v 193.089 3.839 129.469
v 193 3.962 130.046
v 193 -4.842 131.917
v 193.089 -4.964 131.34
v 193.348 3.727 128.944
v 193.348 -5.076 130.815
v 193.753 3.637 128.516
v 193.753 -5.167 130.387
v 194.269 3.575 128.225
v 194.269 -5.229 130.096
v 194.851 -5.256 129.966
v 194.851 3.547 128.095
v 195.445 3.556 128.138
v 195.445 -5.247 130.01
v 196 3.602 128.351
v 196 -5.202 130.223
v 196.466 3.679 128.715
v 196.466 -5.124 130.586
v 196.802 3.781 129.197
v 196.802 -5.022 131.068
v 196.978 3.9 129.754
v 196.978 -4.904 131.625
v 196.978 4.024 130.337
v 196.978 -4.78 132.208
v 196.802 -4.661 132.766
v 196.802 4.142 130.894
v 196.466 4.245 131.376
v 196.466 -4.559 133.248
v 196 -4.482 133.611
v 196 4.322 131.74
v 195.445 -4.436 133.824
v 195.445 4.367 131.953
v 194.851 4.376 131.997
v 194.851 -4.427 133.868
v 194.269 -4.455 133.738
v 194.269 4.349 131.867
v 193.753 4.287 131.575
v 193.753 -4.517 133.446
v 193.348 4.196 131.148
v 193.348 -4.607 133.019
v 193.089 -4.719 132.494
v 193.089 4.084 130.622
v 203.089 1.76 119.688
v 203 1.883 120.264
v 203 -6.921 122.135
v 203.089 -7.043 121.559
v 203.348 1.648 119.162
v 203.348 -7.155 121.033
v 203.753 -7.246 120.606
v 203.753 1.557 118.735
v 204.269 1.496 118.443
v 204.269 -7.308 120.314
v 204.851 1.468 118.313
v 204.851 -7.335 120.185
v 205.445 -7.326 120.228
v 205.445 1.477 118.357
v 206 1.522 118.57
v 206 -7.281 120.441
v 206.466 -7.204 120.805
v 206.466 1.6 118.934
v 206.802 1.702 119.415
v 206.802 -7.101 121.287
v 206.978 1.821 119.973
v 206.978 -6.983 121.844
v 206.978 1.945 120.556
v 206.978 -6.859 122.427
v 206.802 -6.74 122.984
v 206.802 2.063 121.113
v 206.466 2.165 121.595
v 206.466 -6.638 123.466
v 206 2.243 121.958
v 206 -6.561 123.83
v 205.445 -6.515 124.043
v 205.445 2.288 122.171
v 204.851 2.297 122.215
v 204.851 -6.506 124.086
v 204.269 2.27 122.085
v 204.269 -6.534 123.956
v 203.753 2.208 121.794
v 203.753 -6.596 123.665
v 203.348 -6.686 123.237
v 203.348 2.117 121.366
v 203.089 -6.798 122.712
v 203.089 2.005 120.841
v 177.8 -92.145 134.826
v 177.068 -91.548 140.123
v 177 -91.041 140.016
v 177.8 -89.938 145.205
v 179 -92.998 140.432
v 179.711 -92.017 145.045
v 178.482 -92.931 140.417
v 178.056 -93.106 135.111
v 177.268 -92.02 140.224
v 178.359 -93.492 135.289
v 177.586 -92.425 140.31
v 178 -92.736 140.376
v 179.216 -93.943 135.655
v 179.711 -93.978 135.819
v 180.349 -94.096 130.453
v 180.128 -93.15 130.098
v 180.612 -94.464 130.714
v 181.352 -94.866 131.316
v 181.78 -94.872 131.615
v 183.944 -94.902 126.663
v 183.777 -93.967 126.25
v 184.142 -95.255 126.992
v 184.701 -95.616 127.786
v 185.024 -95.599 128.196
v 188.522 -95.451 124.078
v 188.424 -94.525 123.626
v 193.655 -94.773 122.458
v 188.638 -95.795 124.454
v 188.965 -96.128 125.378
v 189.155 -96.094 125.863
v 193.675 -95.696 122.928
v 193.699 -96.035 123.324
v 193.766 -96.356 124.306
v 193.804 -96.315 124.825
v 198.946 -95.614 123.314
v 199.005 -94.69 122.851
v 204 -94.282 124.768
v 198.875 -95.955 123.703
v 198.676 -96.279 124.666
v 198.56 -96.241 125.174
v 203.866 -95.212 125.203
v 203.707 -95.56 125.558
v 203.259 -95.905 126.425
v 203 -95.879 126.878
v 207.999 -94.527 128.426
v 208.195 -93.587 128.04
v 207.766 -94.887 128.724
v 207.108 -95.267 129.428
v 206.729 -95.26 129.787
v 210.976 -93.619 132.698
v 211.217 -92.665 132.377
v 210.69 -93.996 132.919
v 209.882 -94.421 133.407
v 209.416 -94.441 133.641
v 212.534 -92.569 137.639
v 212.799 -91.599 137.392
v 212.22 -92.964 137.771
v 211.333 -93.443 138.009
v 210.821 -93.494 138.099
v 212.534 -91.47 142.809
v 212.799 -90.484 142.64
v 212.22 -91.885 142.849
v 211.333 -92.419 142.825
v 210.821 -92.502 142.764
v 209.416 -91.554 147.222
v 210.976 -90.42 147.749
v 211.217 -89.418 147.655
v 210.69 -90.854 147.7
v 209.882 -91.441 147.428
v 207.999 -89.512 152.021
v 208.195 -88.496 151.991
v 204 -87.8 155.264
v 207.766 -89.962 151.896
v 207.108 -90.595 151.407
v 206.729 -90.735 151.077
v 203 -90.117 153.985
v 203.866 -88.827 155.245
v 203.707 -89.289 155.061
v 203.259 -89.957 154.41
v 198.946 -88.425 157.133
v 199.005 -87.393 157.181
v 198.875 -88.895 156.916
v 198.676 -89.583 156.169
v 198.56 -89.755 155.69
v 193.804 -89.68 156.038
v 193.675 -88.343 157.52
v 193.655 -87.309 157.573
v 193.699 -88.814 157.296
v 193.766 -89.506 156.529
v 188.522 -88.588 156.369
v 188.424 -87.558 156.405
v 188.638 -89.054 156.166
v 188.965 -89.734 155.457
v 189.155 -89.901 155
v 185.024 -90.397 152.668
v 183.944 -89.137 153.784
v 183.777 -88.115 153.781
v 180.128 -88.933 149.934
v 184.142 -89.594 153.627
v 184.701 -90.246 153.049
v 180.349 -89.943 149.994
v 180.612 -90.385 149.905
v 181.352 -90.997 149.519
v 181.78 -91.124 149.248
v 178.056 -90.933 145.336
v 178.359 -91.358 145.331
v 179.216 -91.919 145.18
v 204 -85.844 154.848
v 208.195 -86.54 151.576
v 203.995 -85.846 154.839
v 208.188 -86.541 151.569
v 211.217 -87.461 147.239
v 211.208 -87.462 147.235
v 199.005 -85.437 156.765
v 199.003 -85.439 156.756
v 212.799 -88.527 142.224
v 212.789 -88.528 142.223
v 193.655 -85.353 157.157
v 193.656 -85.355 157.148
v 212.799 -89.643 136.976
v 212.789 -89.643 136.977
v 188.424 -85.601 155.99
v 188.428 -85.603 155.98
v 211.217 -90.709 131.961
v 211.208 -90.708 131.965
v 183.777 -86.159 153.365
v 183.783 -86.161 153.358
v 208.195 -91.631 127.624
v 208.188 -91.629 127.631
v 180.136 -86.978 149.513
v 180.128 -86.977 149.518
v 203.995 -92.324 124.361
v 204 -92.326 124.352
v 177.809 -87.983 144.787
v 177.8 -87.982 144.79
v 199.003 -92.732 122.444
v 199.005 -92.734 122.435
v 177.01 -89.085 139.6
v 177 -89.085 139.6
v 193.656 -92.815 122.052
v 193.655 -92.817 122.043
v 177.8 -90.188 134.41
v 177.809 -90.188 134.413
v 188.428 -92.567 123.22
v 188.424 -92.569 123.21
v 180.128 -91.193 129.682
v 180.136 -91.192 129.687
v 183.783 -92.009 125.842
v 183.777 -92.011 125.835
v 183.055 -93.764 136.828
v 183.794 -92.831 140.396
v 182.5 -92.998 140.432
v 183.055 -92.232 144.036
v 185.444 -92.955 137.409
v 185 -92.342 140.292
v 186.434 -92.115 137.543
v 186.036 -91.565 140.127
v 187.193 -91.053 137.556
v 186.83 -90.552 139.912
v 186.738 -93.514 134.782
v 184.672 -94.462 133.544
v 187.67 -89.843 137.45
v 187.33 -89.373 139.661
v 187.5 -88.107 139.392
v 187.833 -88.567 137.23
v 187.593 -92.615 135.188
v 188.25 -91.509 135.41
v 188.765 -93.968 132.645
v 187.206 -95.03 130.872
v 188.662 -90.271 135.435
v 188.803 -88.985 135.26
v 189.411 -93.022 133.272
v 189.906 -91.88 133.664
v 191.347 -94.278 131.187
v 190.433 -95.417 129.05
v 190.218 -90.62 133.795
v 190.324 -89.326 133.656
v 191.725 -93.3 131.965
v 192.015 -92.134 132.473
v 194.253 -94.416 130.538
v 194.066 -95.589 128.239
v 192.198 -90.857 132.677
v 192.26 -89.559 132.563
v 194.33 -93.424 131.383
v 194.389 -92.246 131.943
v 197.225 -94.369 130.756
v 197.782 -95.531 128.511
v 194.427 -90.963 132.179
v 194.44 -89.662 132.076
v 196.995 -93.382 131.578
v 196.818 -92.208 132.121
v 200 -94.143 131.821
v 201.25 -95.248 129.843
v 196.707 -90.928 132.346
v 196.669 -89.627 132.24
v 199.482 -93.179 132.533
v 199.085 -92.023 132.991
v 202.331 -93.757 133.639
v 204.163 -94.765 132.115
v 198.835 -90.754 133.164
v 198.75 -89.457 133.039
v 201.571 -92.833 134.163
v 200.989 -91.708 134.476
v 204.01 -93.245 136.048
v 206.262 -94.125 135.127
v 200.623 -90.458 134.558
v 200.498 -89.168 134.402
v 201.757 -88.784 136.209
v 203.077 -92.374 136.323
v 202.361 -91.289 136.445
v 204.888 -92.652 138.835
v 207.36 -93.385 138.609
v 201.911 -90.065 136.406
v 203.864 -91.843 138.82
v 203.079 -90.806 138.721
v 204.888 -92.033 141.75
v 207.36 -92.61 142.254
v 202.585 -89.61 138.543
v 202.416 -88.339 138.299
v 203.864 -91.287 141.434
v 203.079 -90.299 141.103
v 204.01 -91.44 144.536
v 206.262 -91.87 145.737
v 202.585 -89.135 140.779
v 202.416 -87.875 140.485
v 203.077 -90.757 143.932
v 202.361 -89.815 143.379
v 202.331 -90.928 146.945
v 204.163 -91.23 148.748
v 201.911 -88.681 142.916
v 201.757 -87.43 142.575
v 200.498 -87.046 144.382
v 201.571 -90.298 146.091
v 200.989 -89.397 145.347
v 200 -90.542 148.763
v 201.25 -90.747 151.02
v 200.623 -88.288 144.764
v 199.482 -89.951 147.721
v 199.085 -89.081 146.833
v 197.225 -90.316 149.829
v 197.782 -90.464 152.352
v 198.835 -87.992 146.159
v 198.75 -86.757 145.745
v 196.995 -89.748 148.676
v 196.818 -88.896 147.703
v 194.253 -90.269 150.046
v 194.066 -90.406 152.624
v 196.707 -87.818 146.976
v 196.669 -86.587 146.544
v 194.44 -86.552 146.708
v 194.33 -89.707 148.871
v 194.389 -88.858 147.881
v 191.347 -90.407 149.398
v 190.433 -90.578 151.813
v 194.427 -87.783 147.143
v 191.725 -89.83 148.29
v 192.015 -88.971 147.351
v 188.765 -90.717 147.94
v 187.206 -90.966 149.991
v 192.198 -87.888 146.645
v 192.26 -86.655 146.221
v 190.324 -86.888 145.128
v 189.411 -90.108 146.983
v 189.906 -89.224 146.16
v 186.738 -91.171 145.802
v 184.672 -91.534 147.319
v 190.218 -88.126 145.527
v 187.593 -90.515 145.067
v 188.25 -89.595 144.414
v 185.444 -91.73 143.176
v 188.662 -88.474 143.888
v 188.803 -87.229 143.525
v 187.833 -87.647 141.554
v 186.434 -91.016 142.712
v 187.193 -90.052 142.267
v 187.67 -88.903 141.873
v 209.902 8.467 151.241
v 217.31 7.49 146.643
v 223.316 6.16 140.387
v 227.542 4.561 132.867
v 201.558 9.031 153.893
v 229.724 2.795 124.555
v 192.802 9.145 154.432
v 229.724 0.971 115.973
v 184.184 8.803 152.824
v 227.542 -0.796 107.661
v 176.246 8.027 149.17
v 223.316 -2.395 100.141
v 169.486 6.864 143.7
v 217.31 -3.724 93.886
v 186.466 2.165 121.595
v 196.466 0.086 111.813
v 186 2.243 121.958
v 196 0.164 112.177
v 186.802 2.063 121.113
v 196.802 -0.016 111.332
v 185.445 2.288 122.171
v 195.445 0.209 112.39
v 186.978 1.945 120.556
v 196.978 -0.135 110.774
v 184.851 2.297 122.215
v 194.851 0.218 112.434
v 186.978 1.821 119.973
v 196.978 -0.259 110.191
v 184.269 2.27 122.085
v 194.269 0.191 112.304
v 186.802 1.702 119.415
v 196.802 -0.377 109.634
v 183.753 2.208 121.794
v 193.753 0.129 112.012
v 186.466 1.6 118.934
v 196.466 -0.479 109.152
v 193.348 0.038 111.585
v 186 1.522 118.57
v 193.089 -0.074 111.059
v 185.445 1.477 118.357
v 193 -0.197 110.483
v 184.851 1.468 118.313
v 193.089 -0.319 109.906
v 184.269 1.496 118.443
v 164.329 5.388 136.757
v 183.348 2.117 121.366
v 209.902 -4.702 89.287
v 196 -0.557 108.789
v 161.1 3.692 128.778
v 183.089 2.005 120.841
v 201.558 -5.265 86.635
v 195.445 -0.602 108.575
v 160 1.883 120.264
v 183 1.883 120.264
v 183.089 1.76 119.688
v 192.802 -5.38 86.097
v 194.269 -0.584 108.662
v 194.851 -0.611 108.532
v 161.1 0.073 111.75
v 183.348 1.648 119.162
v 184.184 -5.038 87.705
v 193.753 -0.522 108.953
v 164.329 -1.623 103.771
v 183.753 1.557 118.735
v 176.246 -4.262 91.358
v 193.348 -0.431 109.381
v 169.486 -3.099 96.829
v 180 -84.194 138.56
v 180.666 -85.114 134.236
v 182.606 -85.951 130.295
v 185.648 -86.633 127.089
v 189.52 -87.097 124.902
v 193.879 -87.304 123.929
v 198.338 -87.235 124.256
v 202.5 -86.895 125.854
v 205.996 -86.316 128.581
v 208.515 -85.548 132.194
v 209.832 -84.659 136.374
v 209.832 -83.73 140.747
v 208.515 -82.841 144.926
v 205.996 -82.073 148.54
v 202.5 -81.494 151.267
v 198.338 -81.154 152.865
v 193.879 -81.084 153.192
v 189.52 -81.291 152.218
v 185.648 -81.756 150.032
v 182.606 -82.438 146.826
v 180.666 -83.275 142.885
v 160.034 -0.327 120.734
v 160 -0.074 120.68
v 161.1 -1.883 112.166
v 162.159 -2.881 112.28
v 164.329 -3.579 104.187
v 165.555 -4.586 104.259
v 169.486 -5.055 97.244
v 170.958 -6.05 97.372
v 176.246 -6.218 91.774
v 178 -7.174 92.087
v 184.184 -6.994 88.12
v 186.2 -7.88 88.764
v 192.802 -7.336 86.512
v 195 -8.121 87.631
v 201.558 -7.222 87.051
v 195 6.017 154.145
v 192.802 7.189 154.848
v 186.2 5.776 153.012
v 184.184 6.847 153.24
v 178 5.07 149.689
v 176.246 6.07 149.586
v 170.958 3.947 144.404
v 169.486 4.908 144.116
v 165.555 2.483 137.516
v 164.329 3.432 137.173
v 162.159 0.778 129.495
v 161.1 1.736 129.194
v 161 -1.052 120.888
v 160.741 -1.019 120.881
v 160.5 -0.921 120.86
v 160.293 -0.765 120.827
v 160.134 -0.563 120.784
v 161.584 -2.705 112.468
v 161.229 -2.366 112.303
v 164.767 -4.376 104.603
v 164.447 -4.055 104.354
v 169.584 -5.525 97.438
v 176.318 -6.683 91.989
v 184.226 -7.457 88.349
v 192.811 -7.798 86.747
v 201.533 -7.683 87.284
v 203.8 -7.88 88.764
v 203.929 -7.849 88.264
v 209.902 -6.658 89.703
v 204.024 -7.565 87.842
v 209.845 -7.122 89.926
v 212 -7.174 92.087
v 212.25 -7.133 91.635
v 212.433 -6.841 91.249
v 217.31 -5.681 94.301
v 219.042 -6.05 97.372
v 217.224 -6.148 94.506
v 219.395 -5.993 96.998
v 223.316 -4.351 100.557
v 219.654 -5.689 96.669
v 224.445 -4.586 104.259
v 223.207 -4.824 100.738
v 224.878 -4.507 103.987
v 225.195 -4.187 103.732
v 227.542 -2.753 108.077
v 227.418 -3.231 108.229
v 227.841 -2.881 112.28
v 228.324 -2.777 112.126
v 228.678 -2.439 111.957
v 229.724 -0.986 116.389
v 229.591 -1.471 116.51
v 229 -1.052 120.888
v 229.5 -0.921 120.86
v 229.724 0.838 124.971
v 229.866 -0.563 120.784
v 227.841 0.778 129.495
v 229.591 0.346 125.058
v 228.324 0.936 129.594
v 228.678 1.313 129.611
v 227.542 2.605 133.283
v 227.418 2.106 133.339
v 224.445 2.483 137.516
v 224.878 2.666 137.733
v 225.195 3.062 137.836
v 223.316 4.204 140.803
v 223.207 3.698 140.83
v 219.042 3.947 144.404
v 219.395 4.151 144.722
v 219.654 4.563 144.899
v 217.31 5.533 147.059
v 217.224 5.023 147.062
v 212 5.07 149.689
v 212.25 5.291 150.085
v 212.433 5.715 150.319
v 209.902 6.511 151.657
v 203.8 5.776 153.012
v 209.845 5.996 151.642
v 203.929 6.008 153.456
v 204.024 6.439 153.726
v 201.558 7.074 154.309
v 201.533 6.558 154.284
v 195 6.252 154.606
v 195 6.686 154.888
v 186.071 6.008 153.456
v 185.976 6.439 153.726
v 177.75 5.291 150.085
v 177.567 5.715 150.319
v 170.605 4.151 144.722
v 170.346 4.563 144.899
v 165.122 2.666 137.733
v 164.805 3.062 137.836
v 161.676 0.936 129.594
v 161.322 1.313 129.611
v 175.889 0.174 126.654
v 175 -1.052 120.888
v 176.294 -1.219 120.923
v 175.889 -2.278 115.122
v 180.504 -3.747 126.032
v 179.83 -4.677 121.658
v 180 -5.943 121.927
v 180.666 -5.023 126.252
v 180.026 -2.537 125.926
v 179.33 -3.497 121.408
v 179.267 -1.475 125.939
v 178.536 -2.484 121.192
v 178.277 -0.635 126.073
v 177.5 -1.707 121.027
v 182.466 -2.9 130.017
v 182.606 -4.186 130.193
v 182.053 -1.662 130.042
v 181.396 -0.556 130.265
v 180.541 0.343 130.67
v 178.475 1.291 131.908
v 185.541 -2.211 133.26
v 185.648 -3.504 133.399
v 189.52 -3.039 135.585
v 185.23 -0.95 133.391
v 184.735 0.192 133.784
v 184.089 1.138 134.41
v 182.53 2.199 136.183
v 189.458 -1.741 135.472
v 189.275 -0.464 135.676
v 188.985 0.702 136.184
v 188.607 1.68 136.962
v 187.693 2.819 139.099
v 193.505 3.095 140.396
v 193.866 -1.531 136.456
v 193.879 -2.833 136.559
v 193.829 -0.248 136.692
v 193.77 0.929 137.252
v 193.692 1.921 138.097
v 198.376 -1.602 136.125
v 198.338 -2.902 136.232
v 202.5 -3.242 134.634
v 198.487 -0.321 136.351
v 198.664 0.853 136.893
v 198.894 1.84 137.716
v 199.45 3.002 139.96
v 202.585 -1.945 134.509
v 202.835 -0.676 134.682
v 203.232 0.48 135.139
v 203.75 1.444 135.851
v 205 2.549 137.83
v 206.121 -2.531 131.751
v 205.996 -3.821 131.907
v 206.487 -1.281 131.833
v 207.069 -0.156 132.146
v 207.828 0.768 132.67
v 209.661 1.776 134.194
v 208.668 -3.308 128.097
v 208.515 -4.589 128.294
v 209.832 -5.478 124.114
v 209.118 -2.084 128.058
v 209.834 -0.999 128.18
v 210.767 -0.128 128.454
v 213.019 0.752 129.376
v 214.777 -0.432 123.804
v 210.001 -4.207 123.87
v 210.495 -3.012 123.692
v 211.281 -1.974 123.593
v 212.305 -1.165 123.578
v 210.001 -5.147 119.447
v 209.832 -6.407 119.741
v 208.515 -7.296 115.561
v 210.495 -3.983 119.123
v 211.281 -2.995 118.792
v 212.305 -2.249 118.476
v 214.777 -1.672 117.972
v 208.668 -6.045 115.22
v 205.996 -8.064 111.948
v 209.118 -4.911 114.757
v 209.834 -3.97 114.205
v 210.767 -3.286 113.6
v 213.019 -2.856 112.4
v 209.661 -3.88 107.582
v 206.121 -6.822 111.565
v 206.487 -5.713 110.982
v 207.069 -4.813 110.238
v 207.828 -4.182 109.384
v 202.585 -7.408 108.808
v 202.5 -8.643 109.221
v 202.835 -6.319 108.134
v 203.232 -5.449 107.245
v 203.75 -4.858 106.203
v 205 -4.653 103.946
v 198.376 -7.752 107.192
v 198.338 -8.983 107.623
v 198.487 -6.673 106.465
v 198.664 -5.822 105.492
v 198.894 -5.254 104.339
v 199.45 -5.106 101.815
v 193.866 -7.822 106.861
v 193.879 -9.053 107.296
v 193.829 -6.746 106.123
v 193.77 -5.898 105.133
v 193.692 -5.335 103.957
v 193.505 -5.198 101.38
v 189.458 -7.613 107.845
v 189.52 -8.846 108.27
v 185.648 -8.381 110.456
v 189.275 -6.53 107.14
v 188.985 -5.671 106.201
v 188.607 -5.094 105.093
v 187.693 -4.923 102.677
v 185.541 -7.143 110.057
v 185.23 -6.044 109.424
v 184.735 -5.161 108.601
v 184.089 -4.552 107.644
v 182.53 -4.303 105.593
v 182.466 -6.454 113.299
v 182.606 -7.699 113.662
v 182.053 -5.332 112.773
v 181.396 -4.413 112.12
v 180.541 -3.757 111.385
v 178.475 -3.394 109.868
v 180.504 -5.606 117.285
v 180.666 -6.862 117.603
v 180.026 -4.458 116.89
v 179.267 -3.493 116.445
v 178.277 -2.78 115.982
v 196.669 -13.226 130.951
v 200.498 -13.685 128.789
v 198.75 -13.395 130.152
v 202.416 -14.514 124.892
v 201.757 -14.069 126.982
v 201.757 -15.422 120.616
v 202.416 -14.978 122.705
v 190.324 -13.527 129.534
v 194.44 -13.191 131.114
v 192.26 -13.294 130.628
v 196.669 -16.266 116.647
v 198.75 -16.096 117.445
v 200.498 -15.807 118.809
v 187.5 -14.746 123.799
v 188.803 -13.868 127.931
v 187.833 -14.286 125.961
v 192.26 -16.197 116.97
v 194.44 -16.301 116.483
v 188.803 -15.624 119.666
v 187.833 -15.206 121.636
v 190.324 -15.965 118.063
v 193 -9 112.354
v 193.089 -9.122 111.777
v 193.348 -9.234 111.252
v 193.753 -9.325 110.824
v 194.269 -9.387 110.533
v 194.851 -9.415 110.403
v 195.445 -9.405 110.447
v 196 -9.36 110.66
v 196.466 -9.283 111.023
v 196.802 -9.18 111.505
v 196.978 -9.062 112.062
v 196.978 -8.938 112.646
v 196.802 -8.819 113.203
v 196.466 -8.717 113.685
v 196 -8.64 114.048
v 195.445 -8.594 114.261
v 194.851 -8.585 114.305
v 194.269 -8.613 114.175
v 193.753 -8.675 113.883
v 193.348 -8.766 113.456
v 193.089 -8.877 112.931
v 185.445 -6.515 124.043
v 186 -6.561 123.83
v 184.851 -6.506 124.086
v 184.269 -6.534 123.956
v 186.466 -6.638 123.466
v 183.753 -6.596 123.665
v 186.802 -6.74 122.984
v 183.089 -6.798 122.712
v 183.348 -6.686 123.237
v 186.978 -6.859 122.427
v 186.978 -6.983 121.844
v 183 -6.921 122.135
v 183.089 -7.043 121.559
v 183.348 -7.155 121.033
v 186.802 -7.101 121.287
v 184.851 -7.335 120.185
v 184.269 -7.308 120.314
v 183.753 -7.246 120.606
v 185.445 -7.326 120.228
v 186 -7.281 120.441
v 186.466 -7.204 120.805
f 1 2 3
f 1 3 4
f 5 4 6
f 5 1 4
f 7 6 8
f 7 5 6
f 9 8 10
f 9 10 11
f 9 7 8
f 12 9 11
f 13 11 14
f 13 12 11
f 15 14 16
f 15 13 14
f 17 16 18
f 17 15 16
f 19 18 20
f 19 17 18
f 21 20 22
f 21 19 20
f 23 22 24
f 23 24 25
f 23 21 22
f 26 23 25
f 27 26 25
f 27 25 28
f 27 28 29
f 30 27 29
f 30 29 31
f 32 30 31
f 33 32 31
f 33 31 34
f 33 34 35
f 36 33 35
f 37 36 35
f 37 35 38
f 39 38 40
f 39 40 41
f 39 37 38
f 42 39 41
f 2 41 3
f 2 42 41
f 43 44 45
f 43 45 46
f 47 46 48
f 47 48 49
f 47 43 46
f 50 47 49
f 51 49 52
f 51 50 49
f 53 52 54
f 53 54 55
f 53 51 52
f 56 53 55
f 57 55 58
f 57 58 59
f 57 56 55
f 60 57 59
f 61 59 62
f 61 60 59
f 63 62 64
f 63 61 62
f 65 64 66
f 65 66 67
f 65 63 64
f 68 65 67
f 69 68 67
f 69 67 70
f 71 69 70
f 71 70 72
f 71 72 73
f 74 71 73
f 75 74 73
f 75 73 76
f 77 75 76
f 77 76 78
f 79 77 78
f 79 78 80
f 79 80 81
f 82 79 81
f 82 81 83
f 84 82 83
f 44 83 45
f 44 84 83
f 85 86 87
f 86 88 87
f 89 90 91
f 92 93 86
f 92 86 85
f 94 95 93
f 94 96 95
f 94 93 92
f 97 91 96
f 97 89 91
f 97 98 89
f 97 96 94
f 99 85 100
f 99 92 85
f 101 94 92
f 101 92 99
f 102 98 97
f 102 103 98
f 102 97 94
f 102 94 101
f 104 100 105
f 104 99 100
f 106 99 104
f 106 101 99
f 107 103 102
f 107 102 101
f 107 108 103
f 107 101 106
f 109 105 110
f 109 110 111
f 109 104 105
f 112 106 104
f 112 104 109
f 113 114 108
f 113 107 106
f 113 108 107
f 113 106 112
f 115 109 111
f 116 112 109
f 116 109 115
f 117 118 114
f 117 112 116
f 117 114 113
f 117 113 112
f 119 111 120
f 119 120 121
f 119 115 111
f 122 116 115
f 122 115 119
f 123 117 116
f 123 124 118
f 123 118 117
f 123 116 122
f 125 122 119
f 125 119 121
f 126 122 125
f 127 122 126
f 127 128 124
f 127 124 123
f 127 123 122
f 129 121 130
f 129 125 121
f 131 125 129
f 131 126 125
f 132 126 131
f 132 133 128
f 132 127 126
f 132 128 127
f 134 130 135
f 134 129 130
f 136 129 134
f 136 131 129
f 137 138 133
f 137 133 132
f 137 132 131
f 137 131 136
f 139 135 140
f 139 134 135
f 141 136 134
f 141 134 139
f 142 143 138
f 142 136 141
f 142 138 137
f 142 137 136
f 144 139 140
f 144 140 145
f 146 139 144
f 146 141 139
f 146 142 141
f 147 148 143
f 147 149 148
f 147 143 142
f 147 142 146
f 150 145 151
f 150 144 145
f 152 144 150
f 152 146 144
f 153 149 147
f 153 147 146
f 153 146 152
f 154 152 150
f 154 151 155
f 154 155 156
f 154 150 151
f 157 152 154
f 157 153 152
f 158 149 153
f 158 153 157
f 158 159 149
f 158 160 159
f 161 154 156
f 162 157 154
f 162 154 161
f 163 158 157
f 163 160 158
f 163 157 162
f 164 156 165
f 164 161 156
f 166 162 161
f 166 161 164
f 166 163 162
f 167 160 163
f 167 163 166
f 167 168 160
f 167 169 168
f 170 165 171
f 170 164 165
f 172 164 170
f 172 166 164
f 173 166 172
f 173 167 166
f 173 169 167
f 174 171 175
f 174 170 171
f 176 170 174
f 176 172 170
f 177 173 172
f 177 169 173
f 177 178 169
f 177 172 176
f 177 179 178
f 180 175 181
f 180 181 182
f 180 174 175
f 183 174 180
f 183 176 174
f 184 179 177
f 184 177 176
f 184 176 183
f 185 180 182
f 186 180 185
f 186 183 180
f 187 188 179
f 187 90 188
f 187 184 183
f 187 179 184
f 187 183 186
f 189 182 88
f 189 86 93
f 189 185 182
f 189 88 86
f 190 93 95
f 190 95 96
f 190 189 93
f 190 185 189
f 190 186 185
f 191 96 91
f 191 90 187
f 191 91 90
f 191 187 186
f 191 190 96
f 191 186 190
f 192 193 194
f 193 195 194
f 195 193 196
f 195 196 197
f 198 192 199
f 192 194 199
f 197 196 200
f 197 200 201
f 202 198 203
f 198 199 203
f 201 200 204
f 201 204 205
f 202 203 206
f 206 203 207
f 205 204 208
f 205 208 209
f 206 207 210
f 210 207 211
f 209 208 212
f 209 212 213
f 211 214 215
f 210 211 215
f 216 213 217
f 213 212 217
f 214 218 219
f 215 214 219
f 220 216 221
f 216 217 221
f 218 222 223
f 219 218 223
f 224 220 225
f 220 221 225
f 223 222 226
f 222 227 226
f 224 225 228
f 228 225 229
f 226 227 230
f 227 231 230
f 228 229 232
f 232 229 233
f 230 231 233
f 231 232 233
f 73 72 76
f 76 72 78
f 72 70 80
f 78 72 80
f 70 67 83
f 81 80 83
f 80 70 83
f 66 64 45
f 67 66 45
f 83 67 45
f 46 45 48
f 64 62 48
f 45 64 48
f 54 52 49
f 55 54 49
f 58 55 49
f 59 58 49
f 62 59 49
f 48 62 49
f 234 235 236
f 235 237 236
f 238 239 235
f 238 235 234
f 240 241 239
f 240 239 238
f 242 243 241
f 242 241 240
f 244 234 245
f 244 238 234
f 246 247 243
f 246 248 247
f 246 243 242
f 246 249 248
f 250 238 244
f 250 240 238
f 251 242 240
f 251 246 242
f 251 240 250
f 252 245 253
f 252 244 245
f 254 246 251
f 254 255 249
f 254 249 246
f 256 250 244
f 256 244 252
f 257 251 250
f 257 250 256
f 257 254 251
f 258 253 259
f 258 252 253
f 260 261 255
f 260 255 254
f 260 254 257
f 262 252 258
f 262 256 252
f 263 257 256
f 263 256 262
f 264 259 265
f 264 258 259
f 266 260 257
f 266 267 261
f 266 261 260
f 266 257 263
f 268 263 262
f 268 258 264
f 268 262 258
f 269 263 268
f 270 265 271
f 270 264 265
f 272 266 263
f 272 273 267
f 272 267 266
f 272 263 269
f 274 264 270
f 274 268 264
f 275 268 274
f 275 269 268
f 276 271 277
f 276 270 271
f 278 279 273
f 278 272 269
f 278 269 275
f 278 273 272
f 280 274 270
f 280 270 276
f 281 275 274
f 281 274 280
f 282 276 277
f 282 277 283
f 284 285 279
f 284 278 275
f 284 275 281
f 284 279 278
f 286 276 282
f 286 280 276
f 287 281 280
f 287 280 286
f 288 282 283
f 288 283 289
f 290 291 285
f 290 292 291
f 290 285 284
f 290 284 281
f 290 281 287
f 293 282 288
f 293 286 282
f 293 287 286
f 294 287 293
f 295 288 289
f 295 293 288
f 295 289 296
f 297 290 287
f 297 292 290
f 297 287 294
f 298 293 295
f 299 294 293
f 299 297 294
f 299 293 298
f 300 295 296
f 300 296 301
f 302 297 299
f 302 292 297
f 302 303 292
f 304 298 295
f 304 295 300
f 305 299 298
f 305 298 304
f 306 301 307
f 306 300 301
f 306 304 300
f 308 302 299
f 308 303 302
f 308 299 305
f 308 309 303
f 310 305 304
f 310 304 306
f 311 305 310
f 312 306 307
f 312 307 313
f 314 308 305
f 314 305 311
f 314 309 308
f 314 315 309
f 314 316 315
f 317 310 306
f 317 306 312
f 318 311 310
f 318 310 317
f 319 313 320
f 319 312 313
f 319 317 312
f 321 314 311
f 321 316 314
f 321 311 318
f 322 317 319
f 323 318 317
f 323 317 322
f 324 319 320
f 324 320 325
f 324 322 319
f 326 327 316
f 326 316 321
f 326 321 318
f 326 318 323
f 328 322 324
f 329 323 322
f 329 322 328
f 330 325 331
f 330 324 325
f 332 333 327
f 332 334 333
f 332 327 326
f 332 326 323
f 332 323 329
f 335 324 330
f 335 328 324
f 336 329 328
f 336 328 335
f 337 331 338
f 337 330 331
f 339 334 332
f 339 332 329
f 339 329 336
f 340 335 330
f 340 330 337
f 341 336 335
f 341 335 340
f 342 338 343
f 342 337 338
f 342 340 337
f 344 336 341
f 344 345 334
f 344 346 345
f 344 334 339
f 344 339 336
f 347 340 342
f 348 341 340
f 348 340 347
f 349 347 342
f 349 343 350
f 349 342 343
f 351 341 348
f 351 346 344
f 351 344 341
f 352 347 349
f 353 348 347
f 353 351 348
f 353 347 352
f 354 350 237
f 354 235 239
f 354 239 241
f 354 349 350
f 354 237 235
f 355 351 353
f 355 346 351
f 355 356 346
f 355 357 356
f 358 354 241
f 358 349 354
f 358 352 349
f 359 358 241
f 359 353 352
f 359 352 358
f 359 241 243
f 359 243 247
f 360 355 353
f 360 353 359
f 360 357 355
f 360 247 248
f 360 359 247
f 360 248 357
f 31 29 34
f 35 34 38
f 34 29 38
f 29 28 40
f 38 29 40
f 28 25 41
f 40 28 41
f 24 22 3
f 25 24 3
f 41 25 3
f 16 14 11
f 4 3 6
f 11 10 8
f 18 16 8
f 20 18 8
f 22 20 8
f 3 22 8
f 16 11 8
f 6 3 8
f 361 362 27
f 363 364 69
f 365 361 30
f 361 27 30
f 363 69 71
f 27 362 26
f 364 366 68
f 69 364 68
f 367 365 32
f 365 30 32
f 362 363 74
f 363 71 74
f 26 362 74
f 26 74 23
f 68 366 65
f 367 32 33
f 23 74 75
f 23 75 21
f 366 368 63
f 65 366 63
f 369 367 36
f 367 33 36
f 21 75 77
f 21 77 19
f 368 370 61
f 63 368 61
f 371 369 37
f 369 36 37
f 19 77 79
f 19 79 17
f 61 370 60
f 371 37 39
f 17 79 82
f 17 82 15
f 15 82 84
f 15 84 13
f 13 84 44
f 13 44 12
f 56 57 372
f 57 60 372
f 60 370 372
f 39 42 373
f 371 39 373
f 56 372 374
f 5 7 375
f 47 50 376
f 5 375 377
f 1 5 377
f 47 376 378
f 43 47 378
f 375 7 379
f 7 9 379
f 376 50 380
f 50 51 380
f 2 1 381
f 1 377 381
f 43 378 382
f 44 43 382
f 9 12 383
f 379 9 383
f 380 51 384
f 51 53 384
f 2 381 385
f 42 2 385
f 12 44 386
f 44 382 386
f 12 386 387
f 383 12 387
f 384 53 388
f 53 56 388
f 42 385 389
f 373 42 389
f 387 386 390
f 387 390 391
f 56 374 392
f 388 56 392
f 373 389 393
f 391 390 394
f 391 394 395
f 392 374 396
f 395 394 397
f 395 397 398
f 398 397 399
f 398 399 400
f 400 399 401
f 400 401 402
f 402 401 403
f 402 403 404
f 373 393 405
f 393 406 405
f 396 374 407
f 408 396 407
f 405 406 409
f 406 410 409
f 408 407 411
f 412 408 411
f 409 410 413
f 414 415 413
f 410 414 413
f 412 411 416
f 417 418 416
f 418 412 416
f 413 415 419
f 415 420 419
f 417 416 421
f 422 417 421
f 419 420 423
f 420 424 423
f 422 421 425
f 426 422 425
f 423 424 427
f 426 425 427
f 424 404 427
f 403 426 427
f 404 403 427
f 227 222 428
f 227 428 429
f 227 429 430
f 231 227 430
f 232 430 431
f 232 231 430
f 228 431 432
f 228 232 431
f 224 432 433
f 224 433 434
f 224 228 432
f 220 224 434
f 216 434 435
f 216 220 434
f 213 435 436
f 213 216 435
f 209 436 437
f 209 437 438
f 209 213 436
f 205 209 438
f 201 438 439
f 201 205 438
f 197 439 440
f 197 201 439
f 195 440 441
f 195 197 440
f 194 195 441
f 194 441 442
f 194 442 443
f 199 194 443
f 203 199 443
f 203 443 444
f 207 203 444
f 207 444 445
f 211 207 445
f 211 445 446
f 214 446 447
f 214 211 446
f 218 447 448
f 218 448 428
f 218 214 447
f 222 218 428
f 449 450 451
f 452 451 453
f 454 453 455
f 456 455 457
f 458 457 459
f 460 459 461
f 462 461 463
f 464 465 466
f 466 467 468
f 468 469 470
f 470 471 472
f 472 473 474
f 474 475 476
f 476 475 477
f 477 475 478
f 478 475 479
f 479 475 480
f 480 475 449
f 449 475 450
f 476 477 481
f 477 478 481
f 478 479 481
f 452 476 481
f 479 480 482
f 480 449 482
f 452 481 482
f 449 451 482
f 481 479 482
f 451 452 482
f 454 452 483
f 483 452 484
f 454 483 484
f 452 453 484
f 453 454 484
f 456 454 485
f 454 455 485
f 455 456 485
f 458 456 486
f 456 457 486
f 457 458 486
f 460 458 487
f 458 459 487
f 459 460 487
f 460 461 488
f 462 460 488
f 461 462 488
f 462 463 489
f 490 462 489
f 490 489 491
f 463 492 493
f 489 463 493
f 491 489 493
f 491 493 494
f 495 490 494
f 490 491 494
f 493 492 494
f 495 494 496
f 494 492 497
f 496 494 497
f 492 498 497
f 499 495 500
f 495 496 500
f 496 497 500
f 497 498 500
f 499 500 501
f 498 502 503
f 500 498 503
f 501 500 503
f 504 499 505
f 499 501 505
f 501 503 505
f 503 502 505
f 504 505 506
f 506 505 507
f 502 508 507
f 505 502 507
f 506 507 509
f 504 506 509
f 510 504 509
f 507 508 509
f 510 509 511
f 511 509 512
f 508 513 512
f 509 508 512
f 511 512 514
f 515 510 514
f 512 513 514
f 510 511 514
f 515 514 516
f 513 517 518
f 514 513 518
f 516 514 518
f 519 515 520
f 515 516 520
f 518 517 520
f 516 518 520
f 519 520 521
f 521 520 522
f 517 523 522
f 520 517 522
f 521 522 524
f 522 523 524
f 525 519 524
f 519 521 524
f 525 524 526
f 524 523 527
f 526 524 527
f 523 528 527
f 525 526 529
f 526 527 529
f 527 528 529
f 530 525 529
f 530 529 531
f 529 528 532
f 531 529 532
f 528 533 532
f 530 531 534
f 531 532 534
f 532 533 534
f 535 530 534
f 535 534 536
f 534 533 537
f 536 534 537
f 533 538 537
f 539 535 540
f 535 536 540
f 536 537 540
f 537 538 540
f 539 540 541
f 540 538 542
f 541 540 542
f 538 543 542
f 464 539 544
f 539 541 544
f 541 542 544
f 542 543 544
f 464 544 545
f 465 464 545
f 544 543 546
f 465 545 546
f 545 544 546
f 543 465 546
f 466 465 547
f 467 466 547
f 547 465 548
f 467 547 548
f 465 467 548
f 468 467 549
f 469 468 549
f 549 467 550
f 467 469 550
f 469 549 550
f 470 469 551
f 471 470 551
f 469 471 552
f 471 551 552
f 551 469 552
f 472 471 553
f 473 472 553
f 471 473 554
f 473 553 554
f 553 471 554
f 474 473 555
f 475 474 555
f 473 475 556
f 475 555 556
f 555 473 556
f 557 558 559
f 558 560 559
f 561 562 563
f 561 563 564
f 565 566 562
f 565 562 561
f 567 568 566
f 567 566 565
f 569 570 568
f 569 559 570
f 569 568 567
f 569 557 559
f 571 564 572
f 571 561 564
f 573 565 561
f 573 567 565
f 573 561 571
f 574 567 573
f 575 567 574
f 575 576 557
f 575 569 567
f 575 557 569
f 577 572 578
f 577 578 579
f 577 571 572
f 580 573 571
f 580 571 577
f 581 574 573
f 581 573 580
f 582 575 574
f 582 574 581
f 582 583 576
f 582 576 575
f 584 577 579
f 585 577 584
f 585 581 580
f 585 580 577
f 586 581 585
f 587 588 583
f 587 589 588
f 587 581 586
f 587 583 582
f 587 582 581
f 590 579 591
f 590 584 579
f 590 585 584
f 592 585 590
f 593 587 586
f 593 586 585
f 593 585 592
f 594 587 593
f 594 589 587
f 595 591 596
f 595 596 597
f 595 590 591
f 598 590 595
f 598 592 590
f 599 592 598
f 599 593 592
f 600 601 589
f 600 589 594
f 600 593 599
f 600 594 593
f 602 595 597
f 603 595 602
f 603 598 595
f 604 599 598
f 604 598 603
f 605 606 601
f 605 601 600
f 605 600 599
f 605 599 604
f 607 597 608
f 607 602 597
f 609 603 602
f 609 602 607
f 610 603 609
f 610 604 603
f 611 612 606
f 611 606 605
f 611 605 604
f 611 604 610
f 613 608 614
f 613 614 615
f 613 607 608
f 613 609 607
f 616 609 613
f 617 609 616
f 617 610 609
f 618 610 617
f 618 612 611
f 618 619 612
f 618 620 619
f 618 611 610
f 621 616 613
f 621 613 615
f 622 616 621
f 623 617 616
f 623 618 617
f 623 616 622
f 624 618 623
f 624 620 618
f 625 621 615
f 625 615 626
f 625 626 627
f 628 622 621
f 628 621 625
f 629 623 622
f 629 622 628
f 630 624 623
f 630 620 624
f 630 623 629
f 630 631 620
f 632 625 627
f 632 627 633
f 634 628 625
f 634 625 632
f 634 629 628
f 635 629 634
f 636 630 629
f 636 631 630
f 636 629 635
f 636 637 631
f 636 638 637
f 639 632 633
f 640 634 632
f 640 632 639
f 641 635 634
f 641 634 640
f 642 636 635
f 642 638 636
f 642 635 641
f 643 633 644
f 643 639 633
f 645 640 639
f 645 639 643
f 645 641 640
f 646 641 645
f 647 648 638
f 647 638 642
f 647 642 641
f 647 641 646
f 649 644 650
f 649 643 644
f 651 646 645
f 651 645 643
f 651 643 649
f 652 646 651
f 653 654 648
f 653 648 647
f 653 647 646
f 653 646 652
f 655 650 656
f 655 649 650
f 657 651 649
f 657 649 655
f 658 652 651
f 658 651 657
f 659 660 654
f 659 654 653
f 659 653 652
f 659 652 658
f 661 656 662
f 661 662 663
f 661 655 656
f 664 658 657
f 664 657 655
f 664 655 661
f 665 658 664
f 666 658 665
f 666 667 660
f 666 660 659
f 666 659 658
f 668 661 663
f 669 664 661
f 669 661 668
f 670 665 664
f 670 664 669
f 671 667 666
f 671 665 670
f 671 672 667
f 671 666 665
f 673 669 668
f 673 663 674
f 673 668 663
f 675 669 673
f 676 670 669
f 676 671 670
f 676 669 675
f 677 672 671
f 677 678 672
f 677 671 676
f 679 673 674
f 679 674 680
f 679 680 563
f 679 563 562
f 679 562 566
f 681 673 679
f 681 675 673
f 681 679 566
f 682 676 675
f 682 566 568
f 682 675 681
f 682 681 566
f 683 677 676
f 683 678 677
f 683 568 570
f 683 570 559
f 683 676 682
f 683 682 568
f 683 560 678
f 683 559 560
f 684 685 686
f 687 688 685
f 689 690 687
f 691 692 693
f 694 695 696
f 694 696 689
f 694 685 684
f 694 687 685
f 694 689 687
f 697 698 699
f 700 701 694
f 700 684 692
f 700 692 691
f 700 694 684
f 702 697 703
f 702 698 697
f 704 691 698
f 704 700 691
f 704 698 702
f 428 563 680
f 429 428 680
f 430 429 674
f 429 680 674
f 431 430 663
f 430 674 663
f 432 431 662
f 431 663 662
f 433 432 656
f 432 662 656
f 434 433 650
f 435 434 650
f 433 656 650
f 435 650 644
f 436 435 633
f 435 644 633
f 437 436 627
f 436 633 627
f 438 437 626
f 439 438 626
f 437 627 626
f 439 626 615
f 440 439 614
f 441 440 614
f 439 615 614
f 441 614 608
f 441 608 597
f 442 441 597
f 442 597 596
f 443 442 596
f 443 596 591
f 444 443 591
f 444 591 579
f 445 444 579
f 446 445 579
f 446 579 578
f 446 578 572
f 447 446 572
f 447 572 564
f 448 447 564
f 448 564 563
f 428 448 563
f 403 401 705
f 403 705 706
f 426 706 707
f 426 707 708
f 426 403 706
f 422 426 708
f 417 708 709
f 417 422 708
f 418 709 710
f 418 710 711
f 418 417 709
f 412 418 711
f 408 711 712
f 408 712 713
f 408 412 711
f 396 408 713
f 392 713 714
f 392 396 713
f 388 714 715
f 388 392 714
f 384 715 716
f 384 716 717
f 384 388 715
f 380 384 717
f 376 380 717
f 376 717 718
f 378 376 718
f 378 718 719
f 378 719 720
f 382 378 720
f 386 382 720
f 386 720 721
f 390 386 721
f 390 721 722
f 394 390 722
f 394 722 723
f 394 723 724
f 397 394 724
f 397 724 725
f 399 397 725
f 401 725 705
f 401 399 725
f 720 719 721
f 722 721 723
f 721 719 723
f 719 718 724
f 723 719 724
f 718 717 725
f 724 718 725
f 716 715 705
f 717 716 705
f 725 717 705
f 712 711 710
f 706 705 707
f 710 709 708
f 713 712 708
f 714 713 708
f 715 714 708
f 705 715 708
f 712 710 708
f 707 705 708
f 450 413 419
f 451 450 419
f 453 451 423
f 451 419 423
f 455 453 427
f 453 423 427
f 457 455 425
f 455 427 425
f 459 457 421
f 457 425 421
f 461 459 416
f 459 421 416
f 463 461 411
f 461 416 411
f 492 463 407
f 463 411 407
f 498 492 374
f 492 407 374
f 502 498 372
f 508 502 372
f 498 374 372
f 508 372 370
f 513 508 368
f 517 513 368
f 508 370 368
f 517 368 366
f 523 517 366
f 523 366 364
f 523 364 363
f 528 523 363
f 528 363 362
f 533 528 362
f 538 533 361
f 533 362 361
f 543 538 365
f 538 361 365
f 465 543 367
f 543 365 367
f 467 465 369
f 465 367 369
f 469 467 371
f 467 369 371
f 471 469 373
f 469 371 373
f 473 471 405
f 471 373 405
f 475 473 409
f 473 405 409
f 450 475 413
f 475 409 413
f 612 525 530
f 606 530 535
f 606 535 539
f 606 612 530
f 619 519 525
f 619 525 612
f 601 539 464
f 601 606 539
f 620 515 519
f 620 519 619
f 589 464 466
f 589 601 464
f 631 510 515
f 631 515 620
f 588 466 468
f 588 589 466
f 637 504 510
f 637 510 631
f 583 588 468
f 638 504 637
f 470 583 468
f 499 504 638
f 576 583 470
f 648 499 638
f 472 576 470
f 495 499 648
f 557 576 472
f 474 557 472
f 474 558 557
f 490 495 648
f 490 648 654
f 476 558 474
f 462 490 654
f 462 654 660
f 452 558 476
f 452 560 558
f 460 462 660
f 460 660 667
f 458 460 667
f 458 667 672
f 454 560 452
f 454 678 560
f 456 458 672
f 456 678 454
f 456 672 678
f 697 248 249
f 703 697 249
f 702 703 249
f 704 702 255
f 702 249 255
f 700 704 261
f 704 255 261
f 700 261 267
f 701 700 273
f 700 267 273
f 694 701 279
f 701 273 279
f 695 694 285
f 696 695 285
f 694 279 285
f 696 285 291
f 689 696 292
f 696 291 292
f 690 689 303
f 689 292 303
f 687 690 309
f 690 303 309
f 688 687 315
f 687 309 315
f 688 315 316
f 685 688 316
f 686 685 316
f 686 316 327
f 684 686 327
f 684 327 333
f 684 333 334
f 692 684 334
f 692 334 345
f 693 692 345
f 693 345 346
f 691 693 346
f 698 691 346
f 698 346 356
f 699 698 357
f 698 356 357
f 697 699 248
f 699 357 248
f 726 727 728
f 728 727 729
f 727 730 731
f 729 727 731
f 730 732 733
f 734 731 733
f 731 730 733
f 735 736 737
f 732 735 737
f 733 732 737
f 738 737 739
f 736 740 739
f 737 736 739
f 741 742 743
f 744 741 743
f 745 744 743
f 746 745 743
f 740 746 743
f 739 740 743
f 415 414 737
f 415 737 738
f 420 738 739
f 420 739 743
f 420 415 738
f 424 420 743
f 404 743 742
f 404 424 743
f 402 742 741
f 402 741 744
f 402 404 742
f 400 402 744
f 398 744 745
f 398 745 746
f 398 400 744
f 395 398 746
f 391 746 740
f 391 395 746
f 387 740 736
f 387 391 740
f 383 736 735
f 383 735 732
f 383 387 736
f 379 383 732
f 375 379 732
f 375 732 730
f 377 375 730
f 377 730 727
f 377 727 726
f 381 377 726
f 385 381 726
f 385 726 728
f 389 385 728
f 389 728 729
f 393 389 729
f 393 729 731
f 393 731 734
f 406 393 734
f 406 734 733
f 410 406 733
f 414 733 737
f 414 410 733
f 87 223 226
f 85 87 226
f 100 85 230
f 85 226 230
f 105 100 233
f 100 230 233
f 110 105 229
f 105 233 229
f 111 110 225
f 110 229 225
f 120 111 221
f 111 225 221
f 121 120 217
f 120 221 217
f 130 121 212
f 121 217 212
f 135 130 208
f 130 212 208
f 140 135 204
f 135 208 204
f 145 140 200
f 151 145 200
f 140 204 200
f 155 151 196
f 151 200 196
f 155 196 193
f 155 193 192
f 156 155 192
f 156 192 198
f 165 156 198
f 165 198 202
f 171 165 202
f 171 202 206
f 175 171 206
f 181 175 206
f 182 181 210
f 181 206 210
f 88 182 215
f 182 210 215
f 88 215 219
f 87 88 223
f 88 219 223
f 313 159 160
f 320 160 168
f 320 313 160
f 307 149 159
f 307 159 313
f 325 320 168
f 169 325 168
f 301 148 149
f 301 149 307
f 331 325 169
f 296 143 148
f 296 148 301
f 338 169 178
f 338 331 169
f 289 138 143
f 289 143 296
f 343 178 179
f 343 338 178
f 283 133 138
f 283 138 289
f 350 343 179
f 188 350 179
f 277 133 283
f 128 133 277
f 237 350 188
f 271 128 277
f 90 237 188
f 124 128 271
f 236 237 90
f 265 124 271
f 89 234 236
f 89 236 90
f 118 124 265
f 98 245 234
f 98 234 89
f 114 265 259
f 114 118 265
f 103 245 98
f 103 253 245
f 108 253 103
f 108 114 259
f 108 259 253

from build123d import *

# Parameters (mm, degrees)
SKETCH029_R      = 35
PAD012_DEPTH     = 3
SKETCH030_R      = 15
PAD013_DEPTH     = 93
SKETCH031_R      = 18
PAD014_DEPTH     = 4
SKETCH032_R      = 7.5
POCKET010_DEPTH  = 80
SKETCH033_R      = 2
POCKET011_DEPTH  = 9
FILLET013_R      = 5
FILLET014_R      = 1
CHAMFER004_SIZE2 = 2.99
CHAMFER004_SIZE  = 5
FILLET015_R      = 2


with BuildPart() as part:
    # Sketch029 (on DatumPlane) → Pad012 (new body)
    with BuildSketch(Plane(origin=(0, 5.625, 137.8708612235), x_dir=(-1, 0, 0), z_dir=(0, -0.9781476007, 0.2079116908))):
        with Locations((-195, 18)):
            Circle(SKETCH029_R)
    extrude(amount=PAD012_DEPTH)

    # Sketch030 (on DatumPlane) → Pad013 (join)
    with BuildSketch(Plane(origin=(0, 5.625, 137.8708612235), x_dir=(-1, 0, 0), z_dir=(0, -0.9781476007, 0.2079116908))):
        with Locations((-195, 18)):
            Circle(SKETCH030_R)
    extrude(amount=PAD013_DEPTH)

    # Sketch031 (on Face6 of Pad013) → Pad014 (join)
    with BuildSketch(Plane(origin=(0, -85.3427268682, 157.2066484695), x_dir=(-1, 0, 0), z_dir=(0, -0.9781476007, 0.2079116908))):
        with Locations((-195, 18)):
            Circle(SKETCH031_R)
    extrude(amount=PAD014_DEPTH)

    # Sketch032 (on Face3 of Pad014) → Pocket010 (cut)
    with BuildSketch(Plane(origin=(0, -89.2553172712, 158.0382952328), x_dir=(-1, 0, 0), z_dir=(0, -0.9781476007, 0.2079116908))):
        with Locations((-195, 18)):
            Circle(SKETCH032_R)
    extrude(amount=-POCKET010_DEPTH, mode=Mode.SUBTRACT)

    # Sketch033 (on ReferenceDatumPlane) → Pocket011 (cut)
    with BuildSketch(Plane(origin=(0, 5.625, 137.8708612235), x_dir=(-1, 0, 0), z_dir=(0, -0.9781476007, 0.2079116908))):
        with Locations((-195, 28)):
            Circle(SKETCH033_R)
        with Locations((-185, 18)):
            Circle(SKETCH033_R)
        with Locations((-195, 8)):
            Circle(SKETCH033_R)
        with Locations((-205, 18)):
            Circle(SKETCH033_R)
    extrude(amount=POCKET011_DEPTH, mode=Mode.SUBTRACT)

    # Fillet013
    fillet013_edges = [part.edges().sort_by_distance(p)[0] for p in [
        (210, -1.051853, 120.887939),
        (202.5, -92.997728, 140.431638),
    ]]
    fillet(fillet013_edges, radius=FILLET013_R)

    # Fillet014
    fillet014_edges = [part.edges().sort_by_distance(p)[0] for p in [
        (230, -1.051853, 120.887939),
    ]]
    fillet(fillet014_edges, radius=FILLET014_R)

    # Chamfer004
    chamfer004_edges = [part.edges().sort_by_distance(p)[0] for p in [
        (210, -89.085137, 139.599992),
    ]]
    chamfer004_side = part.faces().sort_by_distance((210, -47.513864, 130.763745))[0]
    chamfer(chamfer004_edges, length=CHAMFER004_SIZE, length2=CHAMFER004_SIZE2, reference=chamfer004_side)

    # Fillet015
    fillet015_edges = [part.edges().sort_by_distance(p)[0] for p in [
        (213, -92.997728, 140.431638),
    ]]
    fillet(fillet015_edges, radius=FILLET015_R)


solid = part.part
